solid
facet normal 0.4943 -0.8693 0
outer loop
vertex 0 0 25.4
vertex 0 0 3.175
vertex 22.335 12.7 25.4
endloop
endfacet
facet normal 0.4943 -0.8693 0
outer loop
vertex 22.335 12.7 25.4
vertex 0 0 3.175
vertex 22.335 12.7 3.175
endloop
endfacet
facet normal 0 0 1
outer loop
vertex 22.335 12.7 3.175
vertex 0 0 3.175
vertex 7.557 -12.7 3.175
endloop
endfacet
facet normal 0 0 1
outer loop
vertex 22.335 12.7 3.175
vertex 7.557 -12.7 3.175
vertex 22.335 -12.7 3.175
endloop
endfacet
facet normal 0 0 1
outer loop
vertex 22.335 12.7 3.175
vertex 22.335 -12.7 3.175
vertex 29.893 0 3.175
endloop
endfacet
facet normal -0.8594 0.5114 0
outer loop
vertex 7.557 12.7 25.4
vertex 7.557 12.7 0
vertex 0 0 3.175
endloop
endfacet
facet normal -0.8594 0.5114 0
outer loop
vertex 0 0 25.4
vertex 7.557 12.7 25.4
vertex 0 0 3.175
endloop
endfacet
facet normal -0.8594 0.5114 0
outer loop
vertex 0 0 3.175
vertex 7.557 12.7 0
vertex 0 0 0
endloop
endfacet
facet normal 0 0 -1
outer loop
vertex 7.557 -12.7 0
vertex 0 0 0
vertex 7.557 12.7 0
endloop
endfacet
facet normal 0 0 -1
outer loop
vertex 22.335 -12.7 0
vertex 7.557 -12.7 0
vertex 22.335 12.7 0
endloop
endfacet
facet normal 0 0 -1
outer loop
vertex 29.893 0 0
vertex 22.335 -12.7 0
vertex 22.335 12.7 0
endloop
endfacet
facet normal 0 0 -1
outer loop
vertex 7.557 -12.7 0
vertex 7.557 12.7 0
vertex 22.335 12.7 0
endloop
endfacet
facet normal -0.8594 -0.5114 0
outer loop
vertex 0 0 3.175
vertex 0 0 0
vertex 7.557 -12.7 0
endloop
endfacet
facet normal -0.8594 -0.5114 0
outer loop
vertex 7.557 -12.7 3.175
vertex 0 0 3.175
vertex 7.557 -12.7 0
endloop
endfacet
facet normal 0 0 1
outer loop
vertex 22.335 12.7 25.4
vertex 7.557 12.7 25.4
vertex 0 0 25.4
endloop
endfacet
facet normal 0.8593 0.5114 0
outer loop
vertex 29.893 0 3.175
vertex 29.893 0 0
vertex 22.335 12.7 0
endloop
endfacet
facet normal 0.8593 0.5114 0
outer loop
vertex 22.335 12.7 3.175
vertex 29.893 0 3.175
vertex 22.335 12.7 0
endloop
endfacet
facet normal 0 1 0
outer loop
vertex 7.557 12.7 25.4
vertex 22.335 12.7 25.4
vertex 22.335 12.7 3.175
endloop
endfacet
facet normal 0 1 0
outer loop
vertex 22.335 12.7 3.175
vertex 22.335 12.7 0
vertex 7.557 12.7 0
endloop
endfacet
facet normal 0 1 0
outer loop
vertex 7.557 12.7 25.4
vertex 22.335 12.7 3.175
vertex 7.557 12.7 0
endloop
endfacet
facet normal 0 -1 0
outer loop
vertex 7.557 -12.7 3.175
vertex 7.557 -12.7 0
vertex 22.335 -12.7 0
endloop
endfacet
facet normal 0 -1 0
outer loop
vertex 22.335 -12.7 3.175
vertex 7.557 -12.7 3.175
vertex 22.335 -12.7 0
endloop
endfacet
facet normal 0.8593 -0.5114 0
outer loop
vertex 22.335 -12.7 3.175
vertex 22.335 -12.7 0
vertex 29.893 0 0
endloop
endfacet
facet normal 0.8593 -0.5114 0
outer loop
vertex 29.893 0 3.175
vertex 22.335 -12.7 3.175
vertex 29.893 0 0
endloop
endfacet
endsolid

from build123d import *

# Parameters (mm, degrees)
F1_DEPTH = 3.175
F3_DEPTH = 22.225


# Not quite as in the source:
# - a feature names something its author has since deleted; it is built from what else it names


with BuildPart() as f1:
    # F0 (on Top) → F1 (new body)
    with BuildSketch(Plane.XY):
        Polygon((7.557114383, 12.7), (0, 0), (7.557114383, -12.7), (22.3354761934, -12.7), (29.8925905764, 0), (22.3354761934, 12.7), align=None)
    extrude(amount=F1_DEPTH)

    # F2 (on face) → F3 (join)
    with BuildSketch(Plane.XY.offset(3.175)):
        Polygon((7.557114383, 12.7), (0, 0), (22.3354761934, 12.7), align=None)
    extrude(amount=F3_DEPTH)


solid = f1.part
